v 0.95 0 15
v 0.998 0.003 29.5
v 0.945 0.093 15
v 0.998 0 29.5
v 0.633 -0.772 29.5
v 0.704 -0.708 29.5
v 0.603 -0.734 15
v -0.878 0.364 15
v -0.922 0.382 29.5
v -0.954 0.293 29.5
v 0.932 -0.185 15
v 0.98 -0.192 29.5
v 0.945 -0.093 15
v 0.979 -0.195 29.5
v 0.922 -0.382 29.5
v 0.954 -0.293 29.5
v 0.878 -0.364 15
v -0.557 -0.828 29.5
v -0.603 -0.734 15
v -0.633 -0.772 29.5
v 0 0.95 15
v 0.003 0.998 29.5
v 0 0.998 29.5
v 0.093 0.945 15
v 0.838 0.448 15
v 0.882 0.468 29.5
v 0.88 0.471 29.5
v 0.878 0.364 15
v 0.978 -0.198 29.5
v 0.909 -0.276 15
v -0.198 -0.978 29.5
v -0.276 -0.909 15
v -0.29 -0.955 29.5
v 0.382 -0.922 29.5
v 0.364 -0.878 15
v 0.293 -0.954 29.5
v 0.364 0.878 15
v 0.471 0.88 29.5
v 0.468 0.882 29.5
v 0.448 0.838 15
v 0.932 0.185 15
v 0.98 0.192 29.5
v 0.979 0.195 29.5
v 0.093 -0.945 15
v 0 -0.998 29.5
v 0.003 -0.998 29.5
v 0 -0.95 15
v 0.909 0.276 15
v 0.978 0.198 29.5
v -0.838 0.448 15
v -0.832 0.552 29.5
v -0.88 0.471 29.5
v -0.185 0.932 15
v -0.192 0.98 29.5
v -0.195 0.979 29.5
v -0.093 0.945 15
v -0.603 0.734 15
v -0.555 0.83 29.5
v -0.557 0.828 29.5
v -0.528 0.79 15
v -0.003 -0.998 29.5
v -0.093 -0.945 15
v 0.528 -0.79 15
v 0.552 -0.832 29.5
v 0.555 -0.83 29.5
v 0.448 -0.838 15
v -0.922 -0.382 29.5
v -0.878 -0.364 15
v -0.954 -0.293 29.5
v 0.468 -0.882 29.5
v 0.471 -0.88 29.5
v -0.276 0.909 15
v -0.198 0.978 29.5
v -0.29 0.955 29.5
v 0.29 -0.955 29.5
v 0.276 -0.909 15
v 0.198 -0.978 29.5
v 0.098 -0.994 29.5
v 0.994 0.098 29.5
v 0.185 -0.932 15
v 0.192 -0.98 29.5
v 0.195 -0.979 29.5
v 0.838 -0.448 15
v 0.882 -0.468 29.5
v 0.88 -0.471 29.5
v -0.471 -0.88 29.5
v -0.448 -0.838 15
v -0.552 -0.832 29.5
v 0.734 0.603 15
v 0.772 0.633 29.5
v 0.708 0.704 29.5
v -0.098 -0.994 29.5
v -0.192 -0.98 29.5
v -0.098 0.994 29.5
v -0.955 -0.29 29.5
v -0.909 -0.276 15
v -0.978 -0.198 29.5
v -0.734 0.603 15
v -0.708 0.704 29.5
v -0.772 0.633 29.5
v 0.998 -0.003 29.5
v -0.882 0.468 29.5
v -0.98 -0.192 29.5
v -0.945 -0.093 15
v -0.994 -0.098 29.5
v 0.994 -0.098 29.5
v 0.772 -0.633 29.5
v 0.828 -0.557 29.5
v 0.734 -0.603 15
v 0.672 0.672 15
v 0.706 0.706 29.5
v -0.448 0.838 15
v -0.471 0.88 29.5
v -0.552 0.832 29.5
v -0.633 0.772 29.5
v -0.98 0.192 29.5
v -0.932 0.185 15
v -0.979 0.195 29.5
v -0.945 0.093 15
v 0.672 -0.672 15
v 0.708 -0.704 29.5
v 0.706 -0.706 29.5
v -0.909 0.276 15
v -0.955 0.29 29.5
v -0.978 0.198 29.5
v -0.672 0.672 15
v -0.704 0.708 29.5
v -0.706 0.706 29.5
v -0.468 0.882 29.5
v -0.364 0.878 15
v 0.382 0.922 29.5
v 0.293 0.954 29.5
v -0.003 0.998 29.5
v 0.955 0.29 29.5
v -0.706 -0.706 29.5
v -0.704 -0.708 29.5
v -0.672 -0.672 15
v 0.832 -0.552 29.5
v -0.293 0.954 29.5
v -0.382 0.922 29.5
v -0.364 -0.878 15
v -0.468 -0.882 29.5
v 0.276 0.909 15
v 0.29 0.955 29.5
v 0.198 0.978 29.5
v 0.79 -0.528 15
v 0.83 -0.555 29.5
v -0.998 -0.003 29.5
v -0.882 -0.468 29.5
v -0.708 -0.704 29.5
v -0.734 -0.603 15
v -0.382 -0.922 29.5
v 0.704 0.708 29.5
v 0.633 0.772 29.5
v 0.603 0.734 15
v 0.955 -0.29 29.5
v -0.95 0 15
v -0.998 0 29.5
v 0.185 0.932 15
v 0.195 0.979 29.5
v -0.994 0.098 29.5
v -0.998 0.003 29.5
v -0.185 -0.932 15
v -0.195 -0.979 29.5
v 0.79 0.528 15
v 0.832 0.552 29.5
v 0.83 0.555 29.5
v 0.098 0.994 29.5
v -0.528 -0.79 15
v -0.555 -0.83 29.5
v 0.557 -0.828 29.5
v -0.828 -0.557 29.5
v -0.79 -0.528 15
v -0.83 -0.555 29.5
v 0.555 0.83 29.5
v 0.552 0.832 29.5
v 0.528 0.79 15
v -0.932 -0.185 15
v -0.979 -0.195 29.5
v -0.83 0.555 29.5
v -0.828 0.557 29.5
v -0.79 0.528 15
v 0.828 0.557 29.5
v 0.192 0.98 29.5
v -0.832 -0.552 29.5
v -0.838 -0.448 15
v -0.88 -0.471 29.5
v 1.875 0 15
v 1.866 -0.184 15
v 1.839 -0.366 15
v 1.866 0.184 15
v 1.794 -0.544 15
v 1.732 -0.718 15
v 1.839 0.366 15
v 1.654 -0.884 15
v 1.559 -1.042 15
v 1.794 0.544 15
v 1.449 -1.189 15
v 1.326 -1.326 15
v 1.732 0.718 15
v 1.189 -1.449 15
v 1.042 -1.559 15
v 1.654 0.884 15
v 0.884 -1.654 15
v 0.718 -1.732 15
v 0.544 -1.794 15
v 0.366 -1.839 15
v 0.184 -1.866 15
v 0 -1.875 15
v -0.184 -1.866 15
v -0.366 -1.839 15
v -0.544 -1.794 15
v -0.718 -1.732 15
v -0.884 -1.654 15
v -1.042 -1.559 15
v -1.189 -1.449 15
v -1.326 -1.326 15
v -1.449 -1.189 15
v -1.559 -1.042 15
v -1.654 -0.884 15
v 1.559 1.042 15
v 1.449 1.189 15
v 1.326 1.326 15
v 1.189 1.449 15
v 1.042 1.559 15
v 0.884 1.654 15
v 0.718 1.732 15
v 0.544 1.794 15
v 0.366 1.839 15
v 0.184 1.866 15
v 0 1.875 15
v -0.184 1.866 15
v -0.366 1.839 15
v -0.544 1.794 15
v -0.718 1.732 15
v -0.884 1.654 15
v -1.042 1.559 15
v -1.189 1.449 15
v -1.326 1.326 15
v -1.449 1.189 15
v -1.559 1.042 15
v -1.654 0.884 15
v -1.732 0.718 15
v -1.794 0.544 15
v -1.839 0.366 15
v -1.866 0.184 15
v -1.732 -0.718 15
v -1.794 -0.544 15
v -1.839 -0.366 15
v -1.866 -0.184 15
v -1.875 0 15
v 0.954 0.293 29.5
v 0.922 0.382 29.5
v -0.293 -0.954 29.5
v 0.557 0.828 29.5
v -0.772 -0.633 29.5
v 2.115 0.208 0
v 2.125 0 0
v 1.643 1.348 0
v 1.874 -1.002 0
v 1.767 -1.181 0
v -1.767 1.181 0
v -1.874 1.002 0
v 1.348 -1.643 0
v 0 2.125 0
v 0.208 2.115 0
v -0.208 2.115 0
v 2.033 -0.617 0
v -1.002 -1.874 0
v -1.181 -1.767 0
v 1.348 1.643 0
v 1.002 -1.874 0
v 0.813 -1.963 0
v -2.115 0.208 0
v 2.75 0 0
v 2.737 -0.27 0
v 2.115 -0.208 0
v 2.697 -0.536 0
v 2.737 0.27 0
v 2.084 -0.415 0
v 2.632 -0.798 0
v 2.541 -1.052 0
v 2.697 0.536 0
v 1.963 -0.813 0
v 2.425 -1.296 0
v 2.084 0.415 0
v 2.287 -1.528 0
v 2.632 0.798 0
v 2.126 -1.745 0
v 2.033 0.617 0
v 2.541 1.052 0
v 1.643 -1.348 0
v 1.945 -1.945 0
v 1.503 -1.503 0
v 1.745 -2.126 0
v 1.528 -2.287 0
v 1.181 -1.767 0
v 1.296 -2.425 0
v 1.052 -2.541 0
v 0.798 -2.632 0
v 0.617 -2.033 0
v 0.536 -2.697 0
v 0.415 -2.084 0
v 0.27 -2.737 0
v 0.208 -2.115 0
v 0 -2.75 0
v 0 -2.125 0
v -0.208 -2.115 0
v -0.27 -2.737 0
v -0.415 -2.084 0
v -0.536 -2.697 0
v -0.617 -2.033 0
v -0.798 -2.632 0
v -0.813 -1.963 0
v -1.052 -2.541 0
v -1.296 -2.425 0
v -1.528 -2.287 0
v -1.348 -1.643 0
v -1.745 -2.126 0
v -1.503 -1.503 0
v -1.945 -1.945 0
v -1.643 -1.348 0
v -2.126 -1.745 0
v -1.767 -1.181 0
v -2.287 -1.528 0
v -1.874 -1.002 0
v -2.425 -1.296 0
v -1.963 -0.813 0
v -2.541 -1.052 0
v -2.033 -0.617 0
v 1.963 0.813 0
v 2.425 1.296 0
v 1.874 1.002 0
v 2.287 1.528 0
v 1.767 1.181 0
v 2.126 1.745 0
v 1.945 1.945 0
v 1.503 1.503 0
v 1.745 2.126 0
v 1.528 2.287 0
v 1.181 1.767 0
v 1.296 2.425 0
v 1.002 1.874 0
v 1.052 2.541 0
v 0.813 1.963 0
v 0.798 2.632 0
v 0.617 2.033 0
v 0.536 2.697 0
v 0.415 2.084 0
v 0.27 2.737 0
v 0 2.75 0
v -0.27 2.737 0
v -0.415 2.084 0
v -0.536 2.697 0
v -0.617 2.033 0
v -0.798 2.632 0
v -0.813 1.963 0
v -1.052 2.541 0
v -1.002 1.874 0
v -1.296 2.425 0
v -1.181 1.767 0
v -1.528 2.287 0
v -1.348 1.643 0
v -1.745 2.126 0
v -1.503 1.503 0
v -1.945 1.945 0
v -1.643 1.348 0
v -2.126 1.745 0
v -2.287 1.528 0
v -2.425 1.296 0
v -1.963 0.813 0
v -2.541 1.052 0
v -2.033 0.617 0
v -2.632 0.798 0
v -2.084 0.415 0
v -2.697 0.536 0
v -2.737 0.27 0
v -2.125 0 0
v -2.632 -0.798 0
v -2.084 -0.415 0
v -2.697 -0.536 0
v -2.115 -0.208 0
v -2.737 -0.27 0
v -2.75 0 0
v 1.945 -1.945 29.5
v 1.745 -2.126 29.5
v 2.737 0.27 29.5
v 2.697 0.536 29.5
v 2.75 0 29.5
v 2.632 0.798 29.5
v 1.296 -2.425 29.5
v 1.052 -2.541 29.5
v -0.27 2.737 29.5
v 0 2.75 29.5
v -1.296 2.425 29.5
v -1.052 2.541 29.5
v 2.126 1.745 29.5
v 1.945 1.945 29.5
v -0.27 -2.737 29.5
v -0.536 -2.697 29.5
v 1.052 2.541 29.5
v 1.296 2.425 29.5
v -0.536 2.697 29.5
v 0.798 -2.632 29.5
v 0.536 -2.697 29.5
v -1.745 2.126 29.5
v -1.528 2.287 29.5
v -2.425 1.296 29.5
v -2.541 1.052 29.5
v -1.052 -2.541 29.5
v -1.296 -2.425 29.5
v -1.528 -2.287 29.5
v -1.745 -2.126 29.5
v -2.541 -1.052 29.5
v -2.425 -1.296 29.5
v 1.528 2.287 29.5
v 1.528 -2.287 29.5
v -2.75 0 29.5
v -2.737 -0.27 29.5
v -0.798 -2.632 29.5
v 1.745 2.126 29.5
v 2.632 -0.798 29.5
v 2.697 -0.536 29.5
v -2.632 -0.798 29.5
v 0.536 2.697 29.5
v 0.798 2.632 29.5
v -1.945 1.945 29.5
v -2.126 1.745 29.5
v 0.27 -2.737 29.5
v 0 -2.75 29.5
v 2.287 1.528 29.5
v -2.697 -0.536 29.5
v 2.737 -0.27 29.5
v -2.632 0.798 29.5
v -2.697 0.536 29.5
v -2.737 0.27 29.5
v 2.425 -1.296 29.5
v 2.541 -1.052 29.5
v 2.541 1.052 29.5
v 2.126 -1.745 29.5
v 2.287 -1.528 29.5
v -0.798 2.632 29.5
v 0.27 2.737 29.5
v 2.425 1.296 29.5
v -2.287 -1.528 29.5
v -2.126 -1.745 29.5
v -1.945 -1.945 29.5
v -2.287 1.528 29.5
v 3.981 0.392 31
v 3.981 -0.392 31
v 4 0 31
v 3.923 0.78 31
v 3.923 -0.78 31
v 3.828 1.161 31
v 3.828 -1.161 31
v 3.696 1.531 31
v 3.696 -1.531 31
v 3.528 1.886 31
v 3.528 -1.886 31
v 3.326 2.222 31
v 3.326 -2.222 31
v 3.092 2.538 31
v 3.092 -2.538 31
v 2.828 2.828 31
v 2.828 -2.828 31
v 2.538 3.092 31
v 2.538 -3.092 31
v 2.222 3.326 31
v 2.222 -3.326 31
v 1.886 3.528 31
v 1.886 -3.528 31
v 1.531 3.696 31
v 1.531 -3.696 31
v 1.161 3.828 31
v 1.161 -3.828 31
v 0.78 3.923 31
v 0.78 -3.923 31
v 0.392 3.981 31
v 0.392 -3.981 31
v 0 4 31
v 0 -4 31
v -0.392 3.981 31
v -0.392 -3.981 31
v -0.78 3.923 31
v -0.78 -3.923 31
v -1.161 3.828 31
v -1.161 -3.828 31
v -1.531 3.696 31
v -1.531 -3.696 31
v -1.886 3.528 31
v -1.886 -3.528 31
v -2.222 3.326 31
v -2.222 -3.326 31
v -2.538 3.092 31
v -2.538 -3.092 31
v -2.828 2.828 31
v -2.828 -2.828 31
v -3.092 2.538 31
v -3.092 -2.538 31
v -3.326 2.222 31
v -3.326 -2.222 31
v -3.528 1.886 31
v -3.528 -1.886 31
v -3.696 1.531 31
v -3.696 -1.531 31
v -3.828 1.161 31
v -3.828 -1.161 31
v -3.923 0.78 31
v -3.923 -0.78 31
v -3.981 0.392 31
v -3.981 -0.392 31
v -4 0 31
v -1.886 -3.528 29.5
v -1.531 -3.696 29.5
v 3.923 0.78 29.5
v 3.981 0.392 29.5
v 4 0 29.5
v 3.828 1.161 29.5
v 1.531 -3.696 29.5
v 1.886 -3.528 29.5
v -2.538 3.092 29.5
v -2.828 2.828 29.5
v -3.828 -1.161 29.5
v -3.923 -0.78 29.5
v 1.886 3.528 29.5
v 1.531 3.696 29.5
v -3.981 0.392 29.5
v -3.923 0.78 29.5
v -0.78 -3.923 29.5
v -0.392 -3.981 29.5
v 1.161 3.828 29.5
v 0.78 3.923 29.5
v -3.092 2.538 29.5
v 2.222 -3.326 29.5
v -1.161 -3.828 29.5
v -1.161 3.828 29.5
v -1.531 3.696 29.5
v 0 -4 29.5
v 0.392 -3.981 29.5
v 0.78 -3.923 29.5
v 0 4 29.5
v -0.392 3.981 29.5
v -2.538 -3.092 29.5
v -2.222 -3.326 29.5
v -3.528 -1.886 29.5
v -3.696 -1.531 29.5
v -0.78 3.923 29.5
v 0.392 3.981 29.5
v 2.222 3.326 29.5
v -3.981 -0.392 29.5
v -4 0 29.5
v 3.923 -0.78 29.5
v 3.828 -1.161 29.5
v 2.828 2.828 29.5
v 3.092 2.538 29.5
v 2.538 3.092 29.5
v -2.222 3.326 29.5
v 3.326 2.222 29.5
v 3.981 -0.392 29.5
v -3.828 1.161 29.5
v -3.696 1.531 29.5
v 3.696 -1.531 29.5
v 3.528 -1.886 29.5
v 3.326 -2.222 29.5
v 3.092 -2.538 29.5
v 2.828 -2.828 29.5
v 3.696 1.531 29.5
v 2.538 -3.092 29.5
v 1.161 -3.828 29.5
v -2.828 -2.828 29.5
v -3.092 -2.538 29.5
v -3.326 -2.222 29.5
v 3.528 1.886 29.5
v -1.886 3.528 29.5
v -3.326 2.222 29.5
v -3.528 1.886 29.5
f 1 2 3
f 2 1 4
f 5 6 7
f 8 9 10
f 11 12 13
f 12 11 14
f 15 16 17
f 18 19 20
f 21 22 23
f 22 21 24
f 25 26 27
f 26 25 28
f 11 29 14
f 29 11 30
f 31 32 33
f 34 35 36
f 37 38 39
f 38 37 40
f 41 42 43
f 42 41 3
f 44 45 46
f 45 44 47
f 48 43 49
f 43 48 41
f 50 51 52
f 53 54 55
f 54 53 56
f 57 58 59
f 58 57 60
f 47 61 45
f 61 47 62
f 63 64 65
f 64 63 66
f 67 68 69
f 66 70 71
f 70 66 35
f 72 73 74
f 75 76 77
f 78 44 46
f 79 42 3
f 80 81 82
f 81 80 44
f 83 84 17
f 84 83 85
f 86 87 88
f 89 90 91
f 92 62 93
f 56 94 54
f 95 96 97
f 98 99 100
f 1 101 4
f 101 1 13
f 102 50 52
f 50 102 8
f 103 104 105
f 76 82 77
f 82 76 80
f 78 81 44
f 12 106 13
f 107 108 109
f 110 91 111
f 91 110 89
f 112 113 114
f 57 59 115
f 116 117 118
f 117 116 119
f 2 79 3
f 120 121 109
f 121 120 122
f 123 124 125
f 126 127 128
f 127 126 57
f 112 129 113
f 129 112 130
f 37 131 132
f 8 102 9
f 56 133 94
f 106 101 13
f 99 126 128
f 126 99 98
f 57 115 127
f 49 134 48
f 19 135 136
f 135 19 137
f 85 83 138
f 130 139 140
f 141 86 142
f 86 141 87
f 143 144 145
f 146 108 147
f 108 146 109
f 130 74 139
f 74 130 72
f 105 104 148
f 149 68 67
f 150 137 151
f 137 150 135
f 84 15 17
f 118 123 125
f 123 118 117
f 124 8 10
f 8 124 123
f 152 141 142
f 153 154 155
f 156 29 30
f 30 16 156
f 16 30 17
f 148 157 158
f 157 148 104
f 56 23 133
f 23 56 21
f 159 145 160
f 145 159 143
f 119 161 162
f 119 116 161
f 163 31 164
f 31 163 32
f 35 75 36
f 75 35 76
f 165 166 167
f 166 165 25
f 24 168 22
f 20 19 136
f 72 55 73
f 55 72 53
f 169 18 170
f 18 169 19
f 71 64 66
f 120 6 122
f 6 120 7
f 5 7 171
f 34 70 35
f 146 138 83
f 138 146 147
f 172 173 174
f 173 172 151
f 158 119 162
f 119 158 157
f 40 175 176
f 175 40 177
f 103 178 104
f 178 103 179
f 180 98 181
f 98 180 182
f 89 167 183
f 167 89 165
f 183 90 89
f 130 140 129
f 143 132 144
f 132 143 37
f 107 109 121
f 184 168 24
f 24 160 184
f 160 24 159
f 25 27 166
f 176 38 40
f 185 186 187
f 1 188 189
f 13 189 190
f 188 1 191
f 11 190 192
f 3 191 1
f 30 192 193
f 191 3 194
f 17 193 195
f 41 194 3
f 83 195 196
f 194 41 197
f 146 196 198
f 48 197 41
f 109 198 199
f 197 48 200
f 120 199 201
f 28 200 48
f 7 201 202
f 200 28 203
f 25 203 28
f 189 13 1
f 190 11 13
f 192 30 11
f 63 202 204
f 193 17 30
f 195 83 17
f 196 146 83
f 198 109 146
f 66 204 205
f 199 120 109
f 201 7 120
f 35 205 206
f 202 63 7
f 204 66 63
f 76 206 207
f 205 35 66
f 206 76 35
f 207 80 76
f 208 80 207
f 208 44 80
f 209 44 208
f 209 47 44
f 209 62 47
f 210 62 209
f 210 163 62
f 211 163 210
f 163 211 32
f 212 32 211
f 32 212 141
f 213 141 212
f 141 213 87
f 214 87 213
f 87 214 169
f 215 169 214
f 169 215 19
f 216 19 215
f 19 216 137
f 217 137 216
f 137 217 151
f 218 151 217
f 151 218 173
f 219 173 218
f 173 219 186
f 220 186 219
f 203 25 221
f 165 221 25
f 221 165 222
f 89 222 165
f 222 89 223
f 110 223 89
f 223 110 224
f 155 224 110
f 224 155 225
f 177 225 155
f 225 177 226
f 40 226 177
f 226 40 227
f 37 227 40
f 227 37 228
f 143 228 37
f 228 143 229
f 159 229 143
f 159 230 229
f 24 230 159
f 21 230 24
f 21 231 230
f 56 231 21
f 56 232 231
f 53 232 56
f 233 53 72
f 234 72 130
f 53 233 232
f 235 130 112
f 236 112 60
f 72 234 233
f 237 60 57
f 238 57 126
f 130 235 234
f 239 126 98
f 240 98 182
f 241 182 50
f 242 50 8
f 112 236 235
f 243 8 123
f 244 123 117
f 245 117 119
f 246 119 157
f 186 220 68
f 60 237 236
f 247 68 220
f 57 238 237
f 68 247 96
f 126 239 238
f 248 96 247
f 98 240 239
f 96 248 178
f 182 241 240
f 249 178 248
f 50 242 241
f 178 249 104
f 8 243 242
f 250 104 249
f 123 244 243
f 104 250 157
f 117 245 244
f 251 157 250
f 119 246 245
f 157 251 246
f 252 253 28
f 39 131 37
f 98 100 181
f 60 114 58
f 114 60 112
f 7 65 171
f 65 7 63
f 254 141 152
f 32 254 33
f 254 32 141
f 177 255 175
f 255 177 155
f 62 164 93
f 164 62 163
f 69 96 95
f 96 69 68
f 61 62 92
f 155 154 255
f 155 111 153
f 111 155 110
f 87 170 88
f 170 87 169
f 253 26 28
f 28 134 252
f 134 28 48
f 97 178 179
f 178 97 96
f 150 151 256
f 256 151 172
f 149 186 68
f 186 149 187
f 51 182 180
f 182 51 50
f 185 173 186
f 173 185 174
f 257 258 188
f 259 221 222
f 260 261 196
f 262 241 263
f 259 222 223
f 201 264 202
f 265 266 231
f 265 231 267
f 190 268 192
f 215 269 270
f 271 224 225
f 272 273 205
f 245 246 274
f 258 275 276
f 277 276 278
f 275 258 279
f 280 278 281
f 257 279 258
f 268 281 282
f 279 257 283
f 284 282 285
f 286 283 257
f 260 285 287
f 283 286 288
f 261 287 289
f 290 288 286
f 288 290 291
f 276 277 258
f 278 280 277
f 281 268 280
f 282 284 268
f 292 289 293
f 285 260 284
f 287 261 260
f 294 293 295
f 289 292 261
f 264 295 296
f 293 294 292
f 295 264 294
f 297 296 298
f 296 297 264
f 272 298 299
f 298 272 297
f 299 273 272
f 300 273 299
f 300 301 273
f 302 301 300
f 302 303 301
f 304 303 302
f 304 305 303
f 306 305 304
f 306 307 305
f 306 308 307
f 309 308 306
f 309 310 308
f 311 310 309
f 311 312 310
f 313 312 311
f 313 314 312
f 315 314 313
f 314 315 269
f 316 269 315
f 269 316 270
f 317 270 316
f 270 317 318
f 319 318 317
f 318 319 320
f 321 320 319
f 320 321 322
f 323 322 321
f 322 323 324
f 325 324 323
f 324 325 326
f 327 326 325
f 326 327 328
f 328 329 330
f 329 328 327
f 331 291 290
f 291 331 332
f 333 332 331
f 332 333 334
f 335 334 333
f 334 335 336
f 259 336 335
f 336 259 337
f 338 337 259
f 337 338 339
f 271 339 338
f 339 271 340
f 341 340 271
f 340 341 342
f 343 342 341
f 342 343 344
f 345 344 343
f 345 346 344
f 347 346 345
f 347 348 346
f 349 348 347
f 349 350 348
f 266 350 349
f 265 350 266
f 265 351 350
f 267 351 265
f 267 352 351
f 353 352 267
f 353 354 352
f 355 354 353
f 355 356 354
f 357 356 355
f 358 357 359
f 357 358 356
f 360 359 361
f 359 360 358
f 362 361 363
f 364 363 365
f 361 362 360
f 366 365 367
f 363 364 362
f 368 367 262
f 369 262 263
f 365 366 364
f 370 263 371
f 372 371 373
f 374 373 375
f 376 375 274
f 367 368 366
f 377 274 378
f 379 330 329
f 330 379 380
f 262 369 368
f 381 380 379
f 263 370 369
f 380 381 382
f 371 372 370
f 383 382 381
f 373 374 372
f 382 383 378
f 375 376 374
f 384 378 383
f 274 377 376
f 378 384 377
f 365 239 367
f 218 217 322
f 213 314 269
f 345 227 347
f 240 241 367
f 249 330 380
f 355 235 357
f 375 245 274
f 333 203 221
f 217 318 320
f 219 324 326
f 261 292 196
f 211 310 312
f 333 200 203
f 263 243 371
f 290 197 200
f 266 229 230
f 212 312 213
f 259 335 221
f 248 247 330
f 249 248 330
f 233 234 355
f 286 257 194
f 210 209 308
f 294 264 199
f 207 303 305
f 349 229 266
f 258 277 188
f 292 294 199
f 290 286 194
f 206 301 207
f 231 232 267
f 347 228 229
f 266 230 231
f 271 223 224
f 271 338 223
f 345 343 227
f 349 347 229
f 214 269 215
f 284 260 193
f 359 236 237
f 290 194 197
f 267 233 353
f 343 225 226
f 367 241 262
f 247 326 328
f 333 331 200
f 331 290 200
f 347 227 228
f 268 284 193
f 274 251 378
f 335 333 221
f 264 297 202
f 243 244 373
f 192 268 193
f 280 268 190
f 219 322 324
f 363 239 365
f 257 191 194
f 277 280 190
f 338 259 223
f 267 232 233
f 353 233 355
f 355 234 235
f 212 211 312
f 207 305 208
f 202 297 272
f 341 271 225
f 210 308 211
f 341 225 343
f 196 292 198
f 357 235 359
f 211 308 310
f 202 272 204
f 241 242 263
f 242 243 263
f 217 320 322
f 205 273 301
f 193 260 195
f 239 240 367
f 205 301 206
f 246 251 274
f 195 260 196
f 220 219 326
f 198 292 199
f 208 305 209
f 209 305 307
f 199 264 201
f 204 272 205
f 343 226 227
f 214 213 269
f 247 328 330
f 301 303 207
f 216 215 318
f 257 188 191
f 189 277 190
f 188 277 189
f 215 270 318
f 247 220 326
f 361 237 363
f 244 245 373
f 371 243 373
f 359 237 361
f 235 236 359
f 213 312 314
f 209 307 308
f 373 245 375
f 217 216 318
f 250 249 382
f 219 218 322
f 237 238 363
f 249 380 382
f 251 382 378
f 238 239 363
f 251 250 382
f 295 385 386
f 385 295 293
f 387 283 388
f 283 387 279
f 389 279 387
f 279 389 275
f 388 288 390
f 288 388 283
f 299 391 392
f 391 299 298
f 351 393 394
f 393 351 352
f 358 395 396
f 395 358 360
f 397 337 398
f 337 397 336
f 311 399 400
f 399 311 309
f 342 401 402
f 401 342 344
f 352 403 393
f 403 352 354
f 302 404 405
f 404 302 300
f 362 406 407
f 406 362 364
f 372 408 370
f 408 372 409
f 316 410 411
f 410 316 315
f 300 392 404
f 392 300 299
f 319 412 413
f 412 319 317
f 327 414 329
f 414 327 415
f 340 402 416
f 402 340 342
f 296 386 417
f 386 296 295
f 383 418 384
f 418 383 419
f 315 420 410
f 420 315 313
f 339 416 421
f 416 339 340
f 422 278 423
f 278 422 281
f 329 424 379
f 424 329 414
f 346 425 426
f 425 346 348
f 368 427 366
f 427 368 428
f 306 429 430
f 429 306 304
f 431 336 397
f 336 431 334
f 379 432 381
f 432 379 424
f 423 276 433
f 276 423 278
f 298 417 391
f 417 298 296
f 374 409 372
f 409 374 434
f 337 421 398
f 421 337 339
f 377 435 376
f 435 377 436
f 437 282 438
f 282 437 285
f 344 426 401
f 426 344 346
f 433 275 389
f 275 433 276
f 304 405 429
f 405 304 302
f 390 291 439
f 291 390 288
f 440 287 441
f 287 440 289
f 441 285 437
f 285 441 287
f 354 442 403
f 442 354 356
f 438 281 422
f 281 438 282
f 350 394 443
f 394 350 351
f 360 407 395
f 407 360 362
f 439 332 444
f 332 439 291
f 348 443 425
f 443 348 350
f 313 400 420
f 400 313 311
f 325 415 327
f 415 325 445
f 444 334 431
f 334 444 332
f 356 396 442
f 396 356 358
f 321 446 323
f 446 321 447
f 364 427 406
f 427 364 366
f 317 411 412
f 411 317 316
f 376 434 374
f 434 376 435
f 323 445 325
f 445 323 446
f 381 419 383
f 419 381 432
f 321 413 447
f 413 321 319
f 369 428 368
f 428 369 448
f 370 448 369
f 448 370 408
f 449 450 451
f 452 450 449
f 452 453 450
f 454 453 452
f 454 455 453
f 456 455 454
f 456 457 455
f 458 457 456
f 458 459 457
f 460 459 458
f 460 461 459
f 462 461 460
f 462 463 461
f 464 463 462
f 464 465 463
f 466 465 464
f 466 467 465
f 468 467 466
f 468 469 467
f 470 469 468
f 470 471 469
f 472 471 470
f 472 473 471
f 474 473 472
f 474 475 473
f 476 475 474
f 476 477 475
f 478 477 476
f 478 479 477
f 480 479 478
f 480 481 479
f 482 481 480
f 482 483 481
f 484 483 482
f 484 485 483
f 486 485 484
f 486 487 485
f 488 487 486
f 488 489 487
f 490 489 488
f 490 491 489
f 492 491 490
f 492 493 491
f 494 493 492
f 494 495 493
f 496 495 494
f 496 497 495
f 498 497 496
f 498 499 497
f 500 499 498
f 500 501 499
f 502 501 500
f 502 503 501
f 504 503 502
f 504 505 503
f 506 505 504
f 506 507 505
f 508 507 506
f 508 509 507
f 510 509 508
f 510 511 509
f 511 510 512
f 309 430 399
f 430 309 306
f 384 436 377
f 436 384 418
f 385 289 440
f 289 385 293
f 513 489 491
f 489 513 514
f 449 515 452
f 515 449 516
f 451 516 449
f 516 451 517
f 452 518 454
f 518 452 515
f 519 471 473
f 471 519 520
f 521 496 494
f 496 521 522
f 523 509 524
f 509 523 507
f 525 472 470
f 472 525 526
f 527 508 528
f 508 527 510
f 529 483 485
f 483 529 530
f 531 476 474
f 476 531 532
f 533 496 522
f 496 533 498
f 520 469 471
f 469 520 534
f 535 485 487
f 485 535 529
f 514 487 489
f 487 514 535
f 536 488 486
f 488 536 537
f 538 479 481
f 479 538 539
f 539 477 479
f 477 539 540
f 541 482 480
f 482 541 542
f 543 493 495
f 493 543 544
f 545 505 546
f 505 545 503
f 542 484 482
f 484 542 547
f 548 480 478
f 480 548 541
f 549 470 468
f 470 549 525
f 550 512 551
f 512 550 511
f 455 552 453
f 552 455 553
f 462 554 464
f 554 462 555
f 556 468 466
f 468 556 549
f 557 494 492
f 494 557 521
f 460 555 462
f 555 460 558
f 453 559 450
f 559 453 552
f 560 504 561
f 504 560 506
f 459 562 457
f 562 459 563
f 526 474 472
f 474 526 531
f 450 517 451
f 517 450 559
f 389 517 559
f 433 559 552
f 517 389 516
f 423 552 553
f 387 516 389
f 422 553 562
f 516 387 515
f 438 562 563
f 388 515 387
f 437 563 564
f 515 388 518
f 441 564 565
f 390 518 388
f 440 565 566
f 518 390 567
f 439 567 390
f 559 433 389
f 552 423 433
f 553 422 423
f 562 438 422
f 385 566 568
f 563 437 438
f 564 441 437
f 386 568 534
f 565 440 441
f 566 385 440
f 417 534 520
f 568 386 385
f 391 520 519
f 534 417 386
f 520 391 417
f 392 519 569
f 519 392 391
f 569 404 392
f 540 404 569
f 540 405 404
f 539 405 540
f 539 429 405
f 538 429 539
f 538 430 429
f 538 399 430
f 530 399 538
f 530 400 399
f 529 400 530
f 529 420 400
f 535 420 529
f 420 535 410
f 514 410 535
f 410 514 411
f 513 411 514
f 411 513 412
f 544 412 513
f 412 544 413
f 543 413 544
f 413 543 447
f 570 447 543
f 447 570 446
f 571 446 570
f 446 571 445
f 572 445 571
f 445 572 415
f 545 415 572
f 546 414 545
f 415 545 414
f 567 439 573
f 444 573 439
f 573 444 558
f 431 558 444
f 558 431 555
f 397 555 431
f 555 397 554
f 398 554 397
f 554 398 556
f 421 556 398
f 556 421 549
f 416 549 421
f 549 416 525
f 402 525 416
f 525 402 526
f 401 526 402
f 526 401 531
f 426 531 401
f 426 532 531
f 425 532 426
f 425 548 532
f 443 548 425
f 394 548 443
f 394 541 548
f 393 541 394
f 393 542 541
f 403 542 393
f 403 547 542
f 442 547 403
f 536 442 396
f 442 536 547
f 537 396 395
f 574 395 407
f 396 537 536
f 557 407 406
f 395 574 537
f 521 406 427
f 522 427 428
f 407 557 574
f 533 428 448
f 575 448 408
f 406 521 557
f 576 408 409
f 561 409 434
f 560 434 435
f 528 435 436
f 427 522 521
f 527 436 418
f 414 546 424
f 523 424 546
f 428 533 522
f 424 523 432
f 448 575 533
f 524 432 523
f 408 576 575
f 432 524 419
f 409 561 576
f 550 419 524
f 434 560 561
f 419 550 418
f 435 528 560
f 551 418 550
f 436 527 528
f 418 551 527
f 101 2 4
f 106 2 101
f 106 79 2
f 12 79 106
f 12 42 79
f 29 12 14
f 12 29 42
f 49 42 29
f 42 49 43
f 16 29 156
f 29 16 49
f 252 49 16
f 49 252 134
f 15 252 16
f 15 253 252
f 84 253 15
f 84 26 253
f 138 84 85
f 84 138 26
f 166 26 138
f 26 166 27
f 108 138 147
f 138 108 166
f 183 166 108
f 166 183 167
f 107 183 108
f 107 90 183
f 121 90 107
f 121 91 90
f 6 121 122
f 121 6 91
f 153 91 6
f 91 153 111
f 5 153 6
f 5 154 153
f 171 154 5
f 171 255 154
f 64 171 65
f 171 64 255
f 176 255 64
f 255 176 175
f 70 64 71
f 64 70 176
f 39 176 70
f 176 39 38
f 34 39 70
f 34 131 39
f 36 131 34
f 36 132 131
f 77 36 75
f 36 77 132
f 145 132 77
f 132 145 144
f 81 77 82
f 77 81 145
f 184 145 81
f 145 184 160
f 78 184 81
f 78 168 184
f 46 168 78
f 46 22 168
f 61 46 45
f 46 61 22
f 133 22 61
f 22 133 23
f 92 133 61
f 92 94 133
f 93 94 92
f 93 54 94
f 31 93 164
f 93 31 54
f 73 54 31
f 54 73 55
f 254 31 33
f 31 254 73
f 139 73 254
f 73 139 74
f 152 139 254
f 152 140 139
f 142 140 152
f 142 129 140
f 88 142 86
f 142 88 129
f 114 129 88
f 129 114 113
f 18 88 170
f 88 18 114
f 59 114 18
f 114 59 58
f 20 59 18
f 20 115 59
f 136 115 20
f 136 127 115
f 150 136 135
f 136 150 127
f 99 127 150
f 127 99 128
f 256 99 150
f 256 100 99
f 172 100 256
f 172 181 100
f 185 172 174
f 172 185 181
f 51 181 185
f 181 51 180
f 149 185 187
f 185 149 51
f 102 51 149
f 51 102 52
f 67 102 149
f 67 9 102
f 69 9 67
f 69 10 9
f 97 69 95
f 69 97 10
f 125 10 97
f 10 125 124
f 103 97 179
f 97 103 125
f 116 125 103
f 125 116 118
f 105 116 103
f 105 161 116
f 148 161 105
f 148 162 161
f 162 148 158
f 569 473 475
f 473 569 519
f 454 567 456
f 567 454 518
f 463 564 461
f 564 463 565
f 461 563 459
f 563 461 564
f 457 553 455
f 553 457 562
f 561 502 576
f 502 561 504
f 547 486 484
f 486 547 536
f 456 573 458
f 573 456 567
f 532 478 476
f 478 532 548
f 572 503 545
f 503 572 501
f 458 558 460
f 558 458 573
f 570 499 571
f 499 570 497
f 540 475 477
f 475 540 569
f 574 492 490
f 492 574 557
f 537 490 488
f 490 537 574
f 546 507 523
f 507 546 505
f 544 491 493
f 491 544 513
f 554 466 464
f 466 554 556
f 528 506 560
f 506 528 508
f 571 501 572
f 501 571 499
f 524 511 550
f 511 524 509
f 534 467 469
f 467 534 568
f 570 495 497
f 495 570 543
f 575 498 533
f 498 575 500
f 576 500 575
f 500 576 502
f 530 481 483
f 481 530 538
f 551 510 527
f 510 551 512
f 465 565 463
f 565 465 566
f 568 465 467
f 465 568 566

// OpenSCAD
PTFE_Outer_Diam=4;
Filament_Width=1.75;
Holder_Thickness=1.5;
Filament_Catch_Length=15;
PTFE_Catch_Length=15;
Total_Height=Filament_Catch_Length+PTFE_Catch_Length+1;
$fn = 64;

union(){

    
    difference()
    {
        // Outer cylinder shell
        cylinder(Total_Height,
                 (PTFE_Outer_Diam/2)+0.75,
                 (PTFE_Outer_Diam/2)+0.75);   
        
        // Hole
        union()                           
        {
            //Filament Catch
            translate([0,0,Filament_Catch_Length])
                cylinder(Filament_Catch_Length,
                         r1=(Filament_Width+0.15)/2,
                         r2=1);
            
            //PTFE Catch
            cylinder( PTFE_Catch_Length,
                      r1 = (PTFE_Outer_Diam+0.25)/2,
                      r2 = (PTFE_Outer_Diam-0.25)/2 );
        }
    }
    
     // Holder
    translate([0,0,Total_Height-Holder_Thickness]) 
        cylinder(Holder_Thickness,
                 PTFE_Outer_Diam,
                 PTFE_Outer_Diam);  
}
